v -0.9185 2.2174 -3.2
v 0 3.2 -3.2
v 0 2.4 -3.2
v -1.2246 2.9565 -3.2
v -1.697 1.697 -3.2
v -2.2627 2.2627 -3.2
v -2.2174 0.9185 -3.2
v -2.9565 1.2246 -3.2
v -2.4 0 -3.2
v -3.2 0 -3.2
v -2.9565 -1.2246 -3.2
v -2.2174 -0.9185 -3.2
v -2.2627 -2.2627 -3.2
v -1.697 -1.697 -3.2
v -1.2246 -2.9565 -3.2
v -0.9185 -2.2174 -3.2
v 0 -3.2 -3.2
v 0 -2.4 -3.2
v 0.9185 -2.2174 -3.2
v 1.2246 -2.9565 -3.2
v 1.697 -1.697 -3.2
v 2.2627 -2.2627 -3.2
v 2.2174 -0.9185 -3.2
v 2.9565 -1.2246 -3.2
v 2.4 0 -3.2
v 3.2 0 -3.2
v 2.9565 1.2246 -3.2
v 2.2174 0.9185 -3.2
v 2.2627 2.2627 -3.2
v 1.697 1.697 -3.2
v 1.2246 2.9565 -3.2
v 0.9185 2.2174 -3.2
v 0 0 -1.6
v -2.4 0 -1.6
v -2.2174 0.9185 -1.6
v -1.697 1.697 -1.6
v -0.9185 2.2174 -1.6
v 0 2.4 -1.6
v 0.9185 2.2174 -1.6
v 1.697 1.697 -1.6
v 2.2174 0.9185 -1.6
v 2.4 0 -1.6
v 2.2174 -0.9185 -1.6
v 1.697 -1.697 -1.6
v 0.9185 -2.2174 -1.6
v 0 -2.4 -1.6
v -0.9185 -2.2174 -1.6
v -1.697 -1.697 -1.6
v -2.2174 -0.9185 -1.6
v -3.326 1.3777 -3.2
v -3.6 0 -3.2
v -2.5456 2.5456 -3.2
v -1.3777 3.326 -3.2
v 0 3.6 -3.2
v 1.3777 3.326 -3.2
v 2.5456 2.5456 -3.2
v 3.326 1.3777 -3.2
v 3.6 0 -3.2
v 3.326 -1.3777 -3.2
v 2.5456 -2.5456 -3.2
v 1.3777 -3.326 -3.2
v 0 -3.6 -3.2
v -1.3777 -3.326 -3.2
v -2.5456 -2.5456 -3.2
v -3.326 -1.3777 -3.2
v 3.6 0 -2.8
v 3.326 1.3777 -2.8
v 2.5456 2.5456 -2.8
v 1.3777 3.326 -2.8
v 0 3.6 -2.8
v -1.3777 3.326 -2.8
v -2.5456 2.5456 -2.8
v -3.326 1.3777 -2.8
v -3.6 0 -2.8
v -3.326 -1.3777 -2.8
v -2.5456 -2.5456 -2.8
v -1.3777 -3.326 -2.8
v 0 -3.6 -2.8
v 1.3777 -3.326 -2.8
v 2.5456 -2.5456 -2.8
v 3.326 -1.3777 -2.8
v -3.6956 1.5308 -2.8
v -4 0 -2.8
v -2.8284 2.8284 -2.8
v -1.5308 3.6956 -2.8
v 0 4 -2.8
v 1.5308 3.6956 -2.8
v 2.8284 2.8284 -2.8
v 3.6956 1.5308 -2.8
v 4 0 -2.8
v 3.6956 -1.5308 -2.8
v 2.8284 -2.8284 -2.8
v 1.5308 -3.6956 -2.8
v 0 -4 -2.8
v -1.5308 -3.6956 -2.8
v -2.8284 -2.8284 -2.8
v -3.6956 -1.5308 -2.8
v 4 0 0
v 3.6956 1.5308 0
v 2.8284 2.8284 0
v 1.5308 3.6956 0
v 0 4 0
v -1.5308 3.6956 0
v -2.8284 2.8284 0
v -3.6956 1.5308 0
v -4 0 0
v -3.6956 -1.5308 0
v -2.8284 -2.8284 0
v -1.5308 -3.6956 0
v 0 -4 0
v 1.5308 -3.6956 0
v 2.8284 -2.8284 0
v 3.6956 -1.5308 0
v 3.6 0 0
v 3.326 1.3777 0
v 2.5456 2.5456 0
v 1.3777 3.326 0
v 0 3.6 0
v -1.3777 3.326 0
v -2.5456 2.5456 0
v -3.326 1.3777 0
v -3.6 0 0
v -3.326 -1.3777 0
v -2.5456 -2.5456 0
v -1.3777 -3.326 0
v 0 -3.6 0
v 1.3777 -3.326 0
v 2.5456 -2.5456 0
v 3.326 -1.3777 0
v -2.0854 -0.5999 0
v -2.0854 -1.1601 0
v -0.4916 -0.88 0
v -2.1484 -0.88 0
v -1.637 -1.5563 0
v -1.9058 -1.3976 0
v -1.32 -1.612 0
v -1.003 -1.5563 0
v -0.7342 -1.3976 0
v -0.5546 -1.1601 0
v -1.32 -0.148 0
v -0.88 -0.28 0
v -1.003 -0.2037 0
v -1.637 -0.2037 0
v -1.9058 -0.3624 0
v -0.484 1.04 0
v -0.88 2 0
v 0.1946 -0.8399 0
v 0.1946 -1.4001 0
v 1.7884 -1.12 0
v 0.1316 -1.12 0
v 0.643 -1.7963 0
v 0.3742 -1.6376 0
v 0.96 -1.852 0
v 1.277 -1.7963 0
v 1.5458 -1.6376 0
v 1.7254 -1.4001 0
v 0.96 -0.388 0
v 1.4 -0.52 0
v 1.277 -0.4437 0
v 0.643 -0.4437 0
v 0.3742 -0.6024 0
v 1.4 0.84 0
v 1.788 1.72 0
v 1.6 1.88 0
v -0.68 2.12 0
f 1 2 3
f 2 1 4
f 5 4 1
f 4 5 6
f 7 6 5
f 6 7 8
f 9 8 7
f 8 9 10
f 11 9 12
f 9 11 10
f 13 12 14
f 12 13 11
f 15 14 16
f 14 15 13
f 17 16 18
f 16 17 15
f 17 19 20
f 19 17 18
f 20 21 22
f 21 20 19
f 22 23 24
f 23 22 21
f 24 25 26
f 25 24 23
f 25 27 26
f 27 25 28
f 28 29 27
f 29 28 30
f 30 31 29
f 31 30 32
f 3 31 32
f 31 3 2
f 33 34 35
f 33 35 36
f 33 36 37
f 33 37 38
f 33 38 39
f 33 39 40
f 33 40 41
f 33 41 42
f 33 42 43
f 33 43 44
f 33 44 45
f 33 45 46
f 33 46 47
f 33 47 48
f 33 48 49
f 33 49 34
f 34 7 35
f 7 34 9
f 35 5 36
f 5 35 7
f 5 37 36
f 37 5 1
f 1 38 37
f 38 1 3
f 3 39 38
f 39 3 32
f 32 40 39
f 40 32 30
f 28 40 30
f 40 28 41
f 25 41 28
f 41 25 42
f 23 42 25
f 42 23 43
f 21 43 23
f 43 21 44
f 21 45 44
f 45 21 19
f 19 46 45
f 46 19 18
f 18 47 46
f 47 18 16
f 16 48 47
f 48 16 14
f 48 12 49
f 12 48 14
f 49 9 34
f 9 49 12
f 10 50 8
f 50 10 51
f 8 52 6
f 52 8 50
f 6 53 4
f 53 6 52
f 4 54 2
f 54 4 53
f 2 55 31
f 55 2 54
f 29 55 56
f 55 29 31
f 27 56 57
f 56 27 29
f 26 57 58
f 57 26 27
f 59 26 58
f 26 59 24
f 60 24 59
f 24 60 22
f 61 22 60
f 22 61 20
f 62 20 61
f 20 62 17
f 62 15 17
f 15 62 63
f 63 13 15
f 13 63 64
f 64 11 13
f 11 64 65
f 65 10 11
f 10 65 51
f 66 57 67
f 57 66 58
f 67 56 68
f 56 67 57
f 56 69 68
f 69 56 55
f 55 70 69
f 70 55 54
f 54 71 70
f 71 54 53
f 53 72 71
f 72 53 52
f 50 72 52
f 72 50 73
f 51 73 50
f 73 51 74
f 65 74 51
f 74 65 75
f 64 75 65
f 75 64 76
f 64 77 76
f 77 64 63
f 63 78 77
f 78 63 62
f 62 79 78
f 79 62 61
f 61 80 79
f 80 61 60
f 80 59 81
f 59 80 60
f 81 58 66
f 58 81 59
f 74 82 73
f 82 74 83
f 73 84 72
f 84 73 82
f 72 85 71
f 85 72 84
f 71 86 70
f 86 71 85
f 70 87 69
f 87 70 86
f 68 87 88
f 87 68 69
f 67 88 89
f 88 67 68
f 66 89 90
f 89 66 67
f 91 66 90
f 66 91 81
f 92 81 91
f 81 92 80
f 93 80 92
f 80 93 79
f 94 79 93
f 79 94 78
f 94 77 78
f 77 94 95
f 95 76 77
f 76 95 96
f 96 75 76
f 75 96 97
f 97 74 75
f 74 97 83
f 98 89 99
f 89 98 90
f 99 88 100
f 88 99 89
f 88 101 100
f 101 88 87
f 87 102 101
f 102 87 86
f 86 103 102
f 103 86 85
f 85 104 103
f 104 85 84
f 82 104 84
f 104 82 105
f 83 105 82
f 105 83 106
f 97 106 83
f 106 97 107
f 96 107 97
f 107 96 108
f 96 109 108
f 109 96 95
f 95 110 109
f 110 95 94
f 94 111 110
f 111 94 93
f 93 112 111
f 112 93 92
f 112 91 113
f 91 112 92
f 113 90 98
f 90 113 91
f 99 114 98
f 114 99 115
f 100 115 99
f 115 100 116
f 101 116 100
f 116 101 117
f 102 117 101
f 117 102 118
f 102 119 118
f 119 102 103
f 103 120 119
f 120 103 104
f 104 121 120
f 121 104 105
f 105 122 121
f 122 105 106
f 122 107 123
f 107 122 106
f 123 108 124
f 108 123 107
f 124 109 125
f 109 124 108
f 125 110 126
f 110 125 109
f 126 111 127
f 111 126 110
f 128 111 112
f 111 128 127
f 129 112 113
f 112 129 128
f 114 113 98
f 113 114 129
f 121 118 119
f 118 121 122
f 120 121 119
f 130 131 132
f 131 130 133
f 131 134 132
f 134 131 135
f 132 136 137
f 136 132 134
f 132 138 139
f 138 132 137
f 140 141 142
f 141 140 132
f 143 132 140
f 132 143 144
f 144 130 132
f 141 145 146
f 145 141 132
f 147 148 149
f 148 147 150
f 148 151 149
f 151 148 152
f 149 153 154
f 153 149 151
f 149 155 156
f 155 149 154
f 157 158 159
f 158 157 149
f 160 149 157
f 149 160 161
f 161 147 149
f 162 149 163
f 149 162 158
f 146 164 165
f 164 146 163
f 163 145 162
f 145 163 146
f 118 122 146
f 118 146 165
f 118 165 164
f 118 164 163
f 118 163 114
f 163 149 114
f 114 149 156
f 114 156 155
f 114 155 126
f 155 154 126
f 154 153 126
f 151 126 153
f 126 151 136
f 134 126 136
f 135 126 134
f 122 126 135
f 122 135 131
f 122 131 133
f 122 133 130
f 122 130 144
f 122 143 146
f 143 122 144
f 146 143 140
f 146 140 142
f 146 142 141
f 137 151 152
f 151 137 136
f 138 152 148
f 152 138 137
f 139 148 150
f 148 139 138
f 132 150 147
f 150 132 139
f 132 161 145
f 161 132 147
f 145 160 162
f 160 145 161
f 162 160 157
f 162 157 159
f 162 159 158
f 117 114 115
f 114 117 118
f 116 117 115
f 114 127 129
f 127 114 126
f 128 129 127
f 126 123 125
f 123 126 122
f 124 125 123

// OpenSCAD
// file: ../p/4-4disc.scad
use <../lib.scad>
function ldraw_lib__4_4disc() = [
// 0 Disc 1.0
// 0 Name: 4-4disc.dat
// 0 Author: James Jessiman
// 0 !LDRAW_ORG Primitive UPDATE 2002-02
// 0 !LICENSE Licensed under CC BY 2.0 and CC BY 4.0 : see CAreadme.txt
// 
// 0 BFC CERTIFY CCW
  [0,"BFC","CERTIFY"],
  [0,"BFC","CCW"],
// 
// 0 !HISTORY 1998-12-15 [PTadmin] Official Update 1998-10
// 0 !HISTORY 2002-03-23 [sbliss] Added BFC statement
// 0 !HISTORY 2002-04-25 [PTadmin] Official Update 2002-02
// 0 !HISTORY 2007-06-24 [PTadmin] Header formatted for Contributor Agreement
// 0 !HISTORY 2008-07-01 [PTadmin] Official Update 2008-01
// 
// 
// 3 16 0 0 0 1 0 0 0.9239 0 0.3827
  [3,16,0,0,0,1,0,0,0.9239,0,0.3827],
// 3 16 0 0 0 0.9239 0 0.3827 0.7071 0 0.7071
  [3,16,0,0,0,0.9239,0,0.3827,0.7071,0,0.7071],
// 3 16 0 0 0 0.7071 0 0.7071 0.3827 0 0.9239
  [3,16,0,0,0,0.7071,0,0.7071,0.3827,0,0.9239],
// 3 16 0 0 0 0.3827 0 0.9239 0 0 1
  [3,16,0,0,0,0.3827,0,0.9239,0,0,1],
// 3 16 0 0 0 0 0 1 -0.3827 0 0.9239
  [3,16,0,0,0,0,0,1,-0.3827,0,0.9239],
// 3 16 0 0 0 -0.3827 0 0.9239 -0.7071 0 0.7071
  [3,16,0,0,0,-0.3827,0,0.9239,-0.7071,0,0.7071],
// 3 16 0 0 0 -0.7071 0 0.7071 -0.9239 0 0.3827
  [3,16,0,0,0,-0.7071,0,0.7071,-0.9239,0,0.3827],
// 3 16 0 0 0 -0.9239 0 0.3827 -1 0 -0
  [3,16,0,0,0,-0.9239,0,0.3827,-1,0,-0],
// 3 16 0 0 0 -1 0 -0 -0.9239 0 -0.3827
  [3,16,0,0,0,-1,0,-0,-0.9239,0,-0.3827],
// 3 16 0 0 0 -0.9239 0 -0.3827 -0.7071 0 -0.7071
  [3,16,0,0,0,-0.9239,0,-0.3827,-0.7071,0,-0.7071],
// 3 16 0 0 0 -0.7071 0 -0.7071 -0.3827 0 -0.9239
  [3,16,0,0,0,-0.7071,0,-0.7071,-0.3827,0,-0.9239],
// 3 16 0 0 0 -0.3827 0 -0.9239 0 0 -1
  [3,16,0,0,0,-0.3827,0,-0.9239,0,0,-1],
// 3 16 0 0 0 0 0 -1 0.3827 0 -0.9239
  [3,16,0,0,0,0,0,-1,0.3827,0,-0.9239],
// 3 16 0 0 0 0.3827 0 -0.9239 0.7071 0 -0.7071
  [3,16,0,0,0,0.3827,0,-0.9239,0.7071,0,-0.7071],
// 3 16 0 0 0 0.7071 0 -0.7071 0.9239 0 -0.3827
  [3,16,0,0,0,0.7071,0,-0.7071,0.9239,0,-0.3827],
// 3 16 0 0 0 0.9239 0 -0.3827 1 0 0
  [3,16,0,0,0,0.9239,0,-0.3827,1,0,0],
// 0
];
module ldraw_lib__4_4disc(step=0, col=false, unit=2/5, alt=false, line=0.2, solid=!$preview)
    makepoly(ldraw_lib__4_4disc(), step=step, col=col, unit=unit, alt=alt, line=line, solid=solid);
ldraw_lib__4_4disc(line=0.2);
// file: ../p/4-4ring3.scad
use <../lib.scad>
function ldraw_lib__4_4ring3() = [
// 0 Ring  3 x 1.0
// 0 Name: 4-4ring3.dat
// 0 Author: James Jessiman
// 0 !LDRAW_ORG Primitive UPDATE 2009-01
// 0 !LICENSE Licensed under CC BY 2.0 and CC BY 4.0 : see CAreadme.txt
// 
// 0 BFC CERTIFY CCW
  [0,"BFC","CERTIFY"],
  [0,"BFC","CCW"],
// 
// 0 !HISTORY 1998-12-15 [PTadmin] Official Update 1998-10
// 0 !HISTORY 2002-04-05 [hafhead] Added BFC statement
// 0 !HISTORY 2002-04-25 [PTadmin] Official Update 2002-02
// 0 !HISTORY 2007-06-24 [PTadmin] Header formatted for Contributor Agreement
// 0 !HISTORY 2008-07-01 [PTadmin] Official Update 2008-01
// 0 !HISTORY 2008-08-26 [cwdee] Switch polygon winding and rename
// 0 !HISTORY 2009-05-02 [PTadmin] Official Update 2009-01
// 
// 
// 4 16 -1.5308 0 3.6956 -1.1481 0 2.7717 0 0 3 0 0 4
  [4,16,-1.5308,0,3.6956,-1.1481,0,2.7717,0,0,3,0,0,4],
// 4 16 -2.8284 0 2.8284 -2.1213 0 2.1213 -1.1481 0 2.7717 -1.5308 0 3.6956
  [4,16,-2.8284,0,2.8284,-2.1213,0,2.1213,-1.1481,0,2.7717,-1.5308,0,3.6956],
// 4 16 -3.6956 0 1.5308 -2.7717 0 1.1481 -2.1213 0 2.1213 -2.8284 0 2.8284
  [4,16,-3.6956,0,1.5308,-2.7717,0,1.1481,-2.1213,0,2.1213,-2.8284,0,2.8284],
// 4 16 -4 0 0 -3 0 0 -2.7717 0 1.1481 -3.6956 0 1.5308
  [4,16,-4,0,0,-3,0,0,-2.7717,0,1.1481,-3.6956,0,1.5308],
// 4 16 -3.6956 0 -1.5308 -2.7717 0 -1.1481 -3 0 0 -4 0 0
  [4,16,-3.6956,0,-1.5308,-2.7717,0,-1.1481,-3,0,0,-4,0,0],
// 4 16 -2.8284 0 -2.8284 -2.1213 0 -2.1213 -2.7717 0 -1.1481 -3.6956 0 -1.5308
  [4,16,-2.8284,0,-2.8284,-2.1213,0,-2.1213,-2.7717,0,-1.1481,-3.6956,0,-1.5308],
// 4 16 -1.5308 0 -3.6956 -1.1481 0 -2.7717 -2.1213 0 -2.1213 -2.8284 0 -2.8284
  [4,16,-1.5308,0,-3.6956,-1.1481,0,-2.7717,-2.1213,0,-2.1213,-2.8284,0,-2.8284],
// 4 16 0 0 -4 0 0 -3 -1.1481 0 -2.7717 -1.5308 0 -3.6956
  [4,16,0,0,-4,0,0,-3,-1.1481,0,-2.7717,-1.5308,0,-3.6956],
// 4 16 1.5308 0 -3.6956 1.1481 0 -2.7717 0 0 -3 0 0 -4
  [4,16,1.5308,0,-3.6956,1.1481,0,-2.7717,0,0,-3,0,0,-4],
// 4 16 2.8284 0 -2.8284 2.1213 0 -2.1213 1.1481 0 -2.7717 1.5308 0 -3.6956
  [4,16,2.8284,0,-2.8284,2.1213,0,-2.1213,1.1481,0,-2.7717,1.5308,0,-3.6956],
// 4 16 3.6956 0 -1.5308 2.7717 0 -1.1481 2.1213 0 -2.1213 2.8284 0 -2.8284
  [4,16,3.6956,0,-1.5308,2.7717,0,-1.1481,2.1213,0,-2.1213,2.8284,0,-2.8284],
// 4 16 4 0 0 3 0 0 2.7717 0 -1.1481 3.6956 0 -1.5308
  [4,16,4,0,0,3,0,0,2.7717,0,-1.1481,3.6956,0,-1.5308],
// 4 16 3.6956 0 1.5308 2.7717 0 1.1481 3 0 0 4 0 0
  [4,16,3.6956,0,1.5308,2.7717,0,1.1481,3,0,0,4,0,0],
// 4 16 2.8284 0 2.8284 2.1213 0 2.1213 2.7717 0 1.1481 3.6956 0 1.5308
  [4,16,2.8284,0,2.8284,2.1213,0,2.1213,2.7717,0,1.1481,3.6956,0,1.5308],
// 4 16 1.5308 0 3.6956 1.1481 0 2.7717 2.1213 0 2.1213 2.8284 0 2.8284
  [4,16,1.5308,0,3.6956,1.1481,0,2.7717,2.1213,0,2.1213,2.8284,0,2.8284],
// 4 16 0 0 4 0 0 3 1.1481 0 2.7717 1.5308 0 3.6956
  [4,16,0,0,4,0,0,3,1.1481,0,2.7717,1.5308,0,3.6956],
// 0
];
module ldraw_lib__4_4ring3(step=0, col=false, unit=2/5, alt=false, line=0.2, solid=!$preview)
    makepoly(ldraw_lib__4_4ring3(), step=step, col=col, unit=unit, alt=alt, line=line, solid=solid);
ldraw_lib__4_4ring3(line=0.2);
// file: ../p/4-4cylc.scad
use <../lib.scad>
use <4-4cyli.scad>
use <4-4disc.scad>
use <4-4edge.scad>
function ldraw_lib__4_4cylc() = [
// 0 Cylinder Closed 1.0
// 0 Name: 4-4cylc.dat
// 0 Author: Alex Taylor [anathema]
// 0 !LDRAW_ORG Primitive UPDATE 2009-02
// 0 !LICENSE Licensed under CC BY 2.0 and CC BY 4.0 : see CAreadme.txt
// 
// 0 BFC CERTIFY CCW
  [0,"BFC","CERTIFY"],
  [0,"BFC","CCW"],
// 
// 0 !HISTORY 2008-12-29 [cwdee] Removed one disc
// 0 !HISTORY 2009-09-03 [PTadmin] Official Update 2009-02
// 
// 
// 1 16 0 0 0 1 0 0 0 1 0 0 0 1 4-4edge.dat
  [1,16,0,0,0,1,0,0,0,1,0,0,0,1, ldraw_lib__4_4edge()],
// 1 16 0 1 0 1 0 0 0 1 0 0 0 1 4-4edge.dat
  [1,16,0,1,0,1,0,0,0,1,0,0,0,1, ldraw_lib__4_4edge()],
// 1 16 0 0 0 1 0 0 0 1 0 0 0 1 4-4disc.dat
  [1,16,0,0,0,1,0,0,0,1,0,0,0,1, ldraw_lib__4_4disc()],
// 1 16 0 0 0 1 0 0 0 1 0 0 0 1 4-4cyli.dat
  [1,16,0,0,0,1,0,0,0,1,0,0,0,1, ldraw_lib__4_4cyli()],
// 0
];
module ldraw_lib__4_4cylc(step=0, col=false, unit=2/5, alt=false, line=0.2, solid=!$preview)
    makepoly(ldraw_lib__4_4cylc(), step=step, col=col, unit=unit, alt=alt, line=line, solid=solid);
ldraw_lib__4_4cylc(line=0.2);
// file: ../p/4-4edge.scad
use <../lib.scad>
function ldraw_lib__4_4edge() = [
// 0 Circle 1.0
// 0 Name: 4-4edge.dat
// 0 Author: James Jessiman
// 0 !LDRAW_ORG Primitive UPDATE 2017-01
// 0 !LICENSE Licensed under CC BY 2.0 and CC BY 4.0 : see CAreadme.txt
// 
// 0 BFC CERTIFY CCW
  [0,"BFC","CERTIFY"],
  [0,"BFC","CCW"],
// 
// 0 !HISTORY 1998-12-15 [PTadmin] Official Update 1998-10
// 0 !HISTORY 2005-12-28 [PTadmin] Official Update 2005-01
// 0 !HISTORY 2007-06-24 [PTadmin] Header formatted for Contributor Agreement
// 0 !HISTORY 2008-07-01 [PTadmin] Official Update 2008-01
// 0 !HISTORY 2017-01-15 [Steffen] BFCed
// 0 !HISTORY 2017-12-30 [PTadmin] Official Update 2017-01
// 
// 
// 2 24 1 0 0 0.9239 0 0.3827
  [2,24,1,0,0,0.9239,0,0.3827],
// 2 24 0.9239 0 0.3827 0.7071 0 0.7071
  [2,24,0.9239,0,0.3827,0.7071,0,0.7071],
// 2 24 0.7071 0 0.7071 0.3827 0 0.9239
  [2,24,0.7071,0,0.7071,0.3827,0,0.9239],
// 2 24 0.3827 0 0.9239 0 0 1
  [2,24,0.3827,0,0.9239,0,0,1],
// 2 24 0 0 1 -0.3827 0 0.9239
  [2,24,0,0,1,-0.3827,0,0.9239],
// 2 24 -0.3827 0 0.9239 -0.7071 0 0.7071
  [2,24,-0.3827,0,0.9239,-0.7071,0,0.7071],
// 2 24 -0.7071 0 0.7071 -0.9239 0 0.3827
  [2,24,-0.7071,0,0.7071,-0.9239,0,0.3827],
// 2 24 -0.9239 0 0.3827 -1 0 -0
  [2,24,-0.9239,0,0.3827,-1,0,-0],
// 2 24 -1 0 -0 -0.9239 0 -0.3827
  [2,24,-1,0,-0,-0.9239,0,-0.3827],
// 2 24 -0.9239 0 -0.3827 -0.7071 0 -0.7071
  [2,24,-0.9239,0,-0.3827,-0.7071,0,-0.7071],
// 2 24 -0.7071 0 -0.7071 -0.3827 0 -0.9239
  [2,24,-0.7071,0,-0.7071,-0.3827,0,-0.9239],
// 2 24 -0.3827 0 -0.9239 0 0 -1
  [2,24,-0.3827,0,-0.9239,0,0,-1],
// 2 24 0 0 -1 0.3827 0 -0.9239
  [2,24,0,0,-1,0.3827,0,-0.9239],
// 2 24 0.3827 0 -0.9239 0.7071 0 -0.7071
  [2,24,0.3827,0,-0.9239,0.7071,0,-0.7071],
// 2 24 0.7071 0 -0.7071 0.9239 0 -0.3827
  [2,24,0.7071,0,-0.7071,0.9239,0,-0.3827],
// 2 24 0.9239 0 -0.3827 1 0 0
  [2,24,0.9239,0,-0.3827,1,0,0],
];
module ldraw_lib__4_4edge(step=0, col=false, unit=2/5, alt=false, line=0.2, solid=!$preview)
    makepoly(ldraw_lib__4_4edge(), step=step, col=col, unit=unit, alt=alt, line=line, solid=solid);
ldraw_lib__4_4edge(line=0.2);
// file: ../p/4-4cyli.scad
use <../lib.scad>
function ldraw_lib__4_4cyli() = [
// 0 Cylinder 1.0
// 0 Name: 4-4cyli.dat
// 0 Author: James Jessiman
// 0 !LDRAW_ORG Primitive UPDATE 2005-01
// 0 !LICENSE Licensed under CC BY 2.0 and CC BY 4.0 : see CAreadme.txt
// 
// 0 BFC CERTIFY CCW
  [0,"BFC","CERTIFY"],
  [0,"BFC","CCW"],
// 
// 0 !HISTORY 1998-12-15 [PTadmin] Official Update 1998-10
// 0 !HISTORY 2002-03-23 [sbliss] Added BFC statement; merged headers from files in distributions LDraw 0.27 and Complete.
// 0 !HISTORY 2002-04-25 [PTadmin] Official Update 2002-02
// 0 !HISTORY 2004-12-14 [guyvivan] BFC CCW
// 0 !HISTORY 2005-12-28 [PTadmin] Official Update 2005-01
// 0 !HISTORY 2007-06-24 [PTadmin] Header formatted for Contributor Agreement
// 0 !HISTORY 2008-07-01 [PTadmin] Official Update 2008-01
// 
// 
// 4 16 1 1 0 0.9239 1 0.3827 0.9239 0 0.3827 1 0 0
  [4,16,1,1,0,0.9239,1,0.3827,0.9239,0,0.3827,1,0,0],
// 5 24 1 0 0 1 1 0 0.9239 0 0.3827 0.9239 0 -0.3827
  [5,24,1,0,0,1,1,0,0.9239,0,0.3827,0.9239,0,-0.3827],
// 4 16 0.9239 1 0.3827 0.7071 1 0.7071 0.7071 0 0.7071 0.9239 0 0.3827
  [4,16,0.9239,1,0.3827,0.7071,1,0.7071,0.7071,0,0.7071,0.9239,0,0.3827],
// 5 24 0.9239 0 0.3827 0.9239 1 0.3827 0.7071 0 0.7071 1 0 0
  [5,24,0.9239,0,0.3827,0.9239,1,0.3827,0.7071,0,0.7071,1,0,0],
// 4 16 0.7071 1 0.7071 0.3827 1 0.9239 0.3827 0 0.9239 0.7071 0 0.7071
  [4,16,0.7071,1,0.7071,0.3827,1,0.9239,0.3827,0,0.9239,0.7071,0,0.7071],
// 5 24 0.7071 0 0.7071 0.7071 1 0.7071 0.3827 0 0.9239 0.9239 0 0.3827
  [5,24,0.7071,0,0.7071,0.7071,1,0.7071,0.3827,0,0.9239,0.9239,0,0.3827],
// 4 16 0.3827 1 0.9239 0 1 1 0 0 1 0.3827 0 0.9239
  [4,16,0.3827,1,0.9239,0,1,1,0,0,1,0.3827,0,0.9239],
// 5 24 0.3827 0 0.9239 0.3827 1 0.9239 0 0 1 0.7071 0 0.7071
  [5,24,0.3827,0,0.9239,0.3827,1,0.9239,0,0,1,0.7071,0,0.7071],
// 4 16 0 1 1 -0.3827 1 0.9239 -0.3827 0 0.9239 0 0 1
  [4,16,0,1,1,-0.3827,1,0.9239,-0.3827,0,0.9239,0,0,1],
// 5 24 0 0 1 0 1 1 -0.3827 0 0.9239 0.3827 0 0.9239
  [5,24,0,0,1,0,1,1,-0.3827,0,0.9239,0.3827,0,0.9239],
// 4 16 -0.3827 1 0.9239 -0.7071 1 0.7071 -0.7071 0 0.7071 -0.3827 0 0.9239
  [4,16,-0.3827,1,0.9239,-0.7071,1,0.7071,-0.7071,0,0.7071,-0.3827,0,0.9239],
// 5 24 -0.3827 0 0.9239 -0.3827 1 0.9239 -0.7071 0 0.7071 0 0 1
  [5,24,-0.3827,0,0.9239,-0.3827,1,0.9239,-0.7071,0,0.7071,0,0,1],
// 4 16 -0.7071 1 0.7071 -0.9239 1 0.3827 -0.9239 0 0.3827 -0.7071 0 0.7071
  [4,16,-0.7071,1,0.7071,-0.9239,1,0.3827,-0.9239,0,0.3827,-0.7071,0,0.7071],
// 5 24 -0.7071 0 0.7071 -0.7071 1 0.7071 -0.9239 0 0.3827 -0.3827 0 0.9239
  [5,24,-0.7071,0,0.7071,-0.7071,1,0.7071,-0.9239,0,0.3827,-0.3827,0,0.9239],
// 4 16 -0.9239 1 0.3827 -1 1 0 -1 0 0 -0.9239 0 0.3827
  [4,16,-0.9239,1,0.3827,-1,1,0,-1,0,0,-0.9239,0,0.3827],
// 5 24 -0.9239 0 0.3827 -0.9239 1 0.3827 -1 0 0 -0.7071 0 0.7071
  [5,24,-0.9239,0,0.3827,-0.9239,1,0.3827,-1,0,0,-0.7071,0,0.7071],
// 4 16 -1 1 0 -0.9239 1 -0.3827 -0.9239 0 -0.3827 -1 0 0
  [4,16,-1,1,0,-0.9239,1,-0.3827,-0.9239,0,-0.3827,-1,0,0],
// 5 24 -1 0 0 -1 1 0 -0.9239 0 -0.3827 -0.9239 0 0.3827
  [5,24,-1,0,0,-1,1,0,-0.9239,0,-0.3827,-0.9239,0,0.3827],
// 4 16 -0.9239 1 -0.3827 -0.7071 1 -0.7071 -0.7071 0 -0.7071 -0.9239 0 -0.3827
  [4,16,-0.9239,1,-0.3827,-0.7071,1,-0.7071,-0.7071,0,-0.7071,-0.9239,0,-0.3827],
// 5 24 -0.9239 0 -0.3827 -0.9239 1 -0.3827 -0.7071 0 -0.7071 -1 0 0
  [5,24,-0.9239,0,-0.3827,-0.9239,1,-0.3827,-0.7071,0,-0.7071,-1,0,0],
// 4 16 -0.7071 1 -0.7071 -0.3827 1 -0.9239 -0.3827 0 -0.9239 -0.7071 0 -0.7071
  [4,16,-0.7071,1,-0.7071,-0.3827,1,-0.9239,-0.3827,0,-0.9239,-0.7071,0,-0.7071],
// 5 24 -0.7071 0 -0.7071 -0.7071 1 -0.7071 -0.3827 0 -0.9239 -0.9239 0 -0.3827
  [5,24,-0.7071,0,-0.7071,-0.7071,1,-0.7071,-0.3827,0,-0.9239,-0.9239,0,-0.3827],
// 4 16 -0.3827 1 -0.9239 0 1 -1 0 0 -1 -0.3827 0 -0.9239
  [4,16,-0.3827,1,-0.9239,0,1,-1,0,0,-1,-0.3827,0,-0.9239],
// 5 24 -0.3827 0 -0.9239 -0.3827 1 -0.9239 0 0 -1 -0.7071 0 -0.7071
  [5,24,-0.3827,0,-0.9239,-0.3827,1,-0.9239,0,0,-1,-0.7071,0,-0.7071],
// 4 16 0 1 -1 0.3827 1 -0.9239 0.3827 0 -0.9239 0 0 -1
  [4,16,0,1,-1,0.3827,1,-0.9239,0.3827,0,-0.9239,0,0,-1],
// 5 24 0 0 -1 0 1 -1 0.3827 0 -0.9239 -0.3827 0 -0.9239
  [5,24,0,0,-1,0,1,-1,0.3827,0,-0.9239,-0.3827,0,-0.9239],
// 4 16 0.3827 1 -0.9239 0.7071 1 -0.7071 0.7071 0 -0.7071 0.3827 0 -0.9239
  [4,16,0.3827,1,-0.9239,0.7071,1,-0.7071,0.7071,0,-0.7071,0.3827,0,-0.9239],
// 5 24 0.3827 0 -0.9239 0.3827 1 -0.9239 0.7071 0 -0.7071 0 0 -1
  [5,24,0.3827,0,-0.9239,0.3827,1,-0.9239,0.7071,0,-0.7071,0,0,-1],
// 4 16 0.7071 1 -0.7071 0.9239 1 -0.3827 0.9239 0 -0.3827 0.7071 0 -0.7071
  [4,16,0.7071,1,-0.7071,0.9239,1,-0.3827,0.9239,0,-0.3827,0.7071,0,-0.7071],
// 5 24 0.7071 0 -0.7071 0.7071 1 -0.7071 0.9239 0 -0.3827 0.3827 0 -0.9239
  [5,24,0.7071,0,-0.7071,0.7071,1,-0.7071,0.9239,0,-0.3827,0.3827,0,-0.9239],
// 4 16 0.9239 1 -0.3827 1 1 0 1 0 0 0.9239 0 -0.3827
  [4,16,0.9239,1,-0.3827,1,1,0,1,0,0,0.9239,0,-0.3827],
// 5 24 0.9239 0 -0.3827 0.9239 1 -0.3827 1 0 0 0.7071 0 -0.7071
  [5,24,0.9239,0,-0.3827,0.9239,1,-0.3827,1,0,0,0.7071,0,-0.7071],
// 0
];
module ldraw_lib__4_4cyli(step=0, col=false, unit=2/5, alt=false, line=0.2, solid=!$preview)
    makepoly(ldraw_lib__4_4cyli(), step=step, col=col, unit=unit, alt=alt, line=line, solid=solid);
ldraw_lib__4_4cyli(line=0.2);
// file: ../p/stud4o.scad
use <../lib.scad>
use <4-4cylc.scad>
use <4-4ring3.scad>
function ldraw_lib__stud4o() = [
// 0 Stud Tube Open without Outer Cylinder
// 0 Name: stud4o.dat
// 0 Author: Magnus Forsberg [MagFors]
// 0 !LDRAW_ORG Primitive UPDATE 2011-02
// 0 !LICENSE Licensed under CC BY 2.0 and CC BY 4.0 : see CAreadme.txt
// 
// 0 !HELP This stud is a "antistud" to be used like a underside stud,
// 0 !HELP but without the outer cylinder.
// 0 !HELP 1 47 0 0 0 1 0 0 0 1 0 0 0 1 stud4.dat
// 
// 0 BFC CERTIFY CCW
  [0,"BFC","CERTIFY"],
  [0,"BFC","CCW"],
// 
// 0 !HISTORY 2011-12-29 [PTadmin] Official Update 2011-02
// 
// 
// 1 16 0 -4 0 2 0 0 0 1 0 0 0 2 4-4ring3.dat
  [1,16,0,-4,0,2,0,0,0,1,0,0,0,2, ldraw_lib__4_4ring3()],
// 0 BFC INVERTNEXT
  [0,"BFC","INVERTNEXT"],
// 1 16 0 0 0 -6 0 0 0 -4 0 0 0 6 4-4cylc.dat
  [1,16,0,0,0,-6,0,0,0,-4,0,0,0,6, ldraw_lib__4_4cylc()],
];
module ldraw_lib__stud4o(step=0, col=false, unit=2/5, alt=false, line=0.2, solid=!$preview)
    makepoly(ldraw_lib__stud4o(), step=step, col=col, unit=unit, alt=alt, line=line, solid=solid);
ldraw_lib__stud4o(line=0.2);
// file: ../p/4-4ring8.scad
use <../lib.scad>
function ldraw_lib__4_4ring8() = [
// 0 Ring  8 x 1.0
// 0 Name: 4-4ring8.dat
// 0 Author: Steffen [Steffen]
// 0 !LDRAW_ORG Primitive UPDATE 2012-01
// 0 !LICENSE Licensed under CC BY 2.0 and CC BY 4.0 : see CAreadme.txt
// 
// 0 BFC CERTIFY CCW
  [0,"BFC","CERTIFY"],
  [0,"BFC","CCW"],
// 
// 0 !HISTORY 2003-12-19 [PTadmin] Official Update 2003-03
// 0 !HISTORY 2007-06-24 [PTadmin] Header formatted for Contributor Agreement
// 0 !HISTORY 2008-07-01 [PTadmin] Official Update 2008-01
// 0 !HISTORY 2012-02-16 [Philo] Changed to CCW
// 0 !HISTORY 2012-03-30 [PTadmin] Official Update 2012-01
// 
// 
// 4 16 9 0 0 8.3151 0 3.4443 7.3912 0 3.0616 8 0 0
  [4,16,9,0,0,8.3151,0,3.4443,7.3912,0,3.0616,8,0,0],
// 4 16 8.3151 0 3.4443 6.3639 0 6.3639 5.6568 0 5.6568 7.3912 0 3.0616
  [4,16,8.3151,0,3.4443,6.3639,0,6.3639,5.6568,0,5.6568,7.3912,0,3.0616],
// 4 16 6.3639 0 6.3639 3.4443 0 8.3151 3.0616 0 7.3912 5.6568 0 5.6568
  [4,16,6.3639,0,6.3639,3.4443,0,8.3151,3.0616,0,7.3912,5.6568,0,5.6568],
// 4 16 3.4443 0 8.3151 0 0 9 0 0 8 3.0616 0 7.3912
  [4,16,3.4443,0,8.3151,0,0,9,0,0,8,3.0616,0,7.3912],
// 4 16 0 0 9 -3.4443 0 8.3151 -3.0616 0 7.3912 0 0 8
  [4,16,0,0,9,-3.4443,0,8.3151,-3.0616,0,7.3912,0,0,8],
// 4 16 -3.4443 0 8.3151 -6.3639 0 6.3639 -5.6568 0 5.6568 -3.0616 0 7.3912
  [4,16,-3.4443,0,8.3151,-6.3639,0,6.3639,-5.6568,0,5.6568,-3.0616,0,7.3912],
// 4 16 -6.3639 0 6.3639 -8.3151 0 3.4443 -7.3912 0 3.0616 -5.6568 0 5.6568
  [4,16,-6.3639,0,6.3639,-8.3151,0,3.4443,-7.3912,0,3.0616,-5.6568,0,5.6568],
// 4 16 -8.3151 0 3.4443 -9 0 0 -8 0 0 -7.3912 0 3.0616
  [4,16,-8.3151,0,3.4443,-9,0,0,-8,0,0,-7.3912,0,3.0616],
// 4 16 -9 0 0 -8.3151 0 -3.4443 -7.3912 0 -3.0616 -8 0 0
  [4,16,-9,0,0,-8.3151,0,-3.4443,-7.3912,0,-3.0616,-8,0,0],
// 4 16 -8.3151 0 -3.4443 -6.3639 0 -6.3639 -5.6568 0 -5.6568 -7.3912 0 -3.0616
  [4,16,-8.3151,0,-3.4443,-6.3639,0,-6.3639,-5.6568,0,-5.6568,-7.3912,0,-3.0616],
// 4 16 -6.3639 0 -6.3639 -3.4443 0 -8.3151 -3.0616 0 -7.3912 -5.6568 0 -5.6568
  [4,16,-6.3639,0,-6.3639,-3.4443,0,-8.3151,-3.0616,0,-7.3912,-5.6568,0,-5.6568],
// 4 16 -3.4443 0 -8.3151 0 0 -9 0 0 -8 -3.0616 0 -7.3912
  [4,16,-3.4443,0,-8.3151,0,0,-9,0,0,-8,-3.0616,0,-7.3912],
// 4 16 0 0 -9 3.4443 0 -8.3151 3.0616 0 -7.3912 0 0 -8
  [4,16,0,0,-9,3.4443,0,-8.3151,3.0616,0,-7.3912,0,0,-8],
// 4 16 3.4443 0 -8.3151 6.3639 0 -6.3639 5.6568 0 -5.6568 3.0616 0 -7.3912
  [4,16,3.4443,0,-8.3151,6.3639,0,-6.3639,5.6568,0,-5.6568,3.0616,0,-7.3912],
// 4 16 6.3639 0 -6.3639 8.3151 0 -3.4443 7.3912 0 -3.0616 5.6568 0 -5.6568
  [4,16,6.3639,0,-6.3639,8.3151,0,-3.4443,7.3912,0,-3.0616,5.6568,0,-5.6568],
// 4 16 8.3151 0 -3.4443 9 0 0 8 0 0 7.3912 0 -3.0616
  [4,16,8.3151,0,-3.4443,9,0,0,8,0,0,7.3912,0,-3.0616],
];
module ldraw_lib__4_4ring8(step=0, col=false, unit=2/5, alt=false, line=0.2, solid=!$preview)
    makepoly(ldraw_lib__4_4ring8(), step=step, col=col, unit=unit, alt=alt, line=line, solid=solid);
ldraw_lib__4_4ring8(line=0.2);
// file: ../p/4-4cylo.scad
use <../lib.scad>
use <4-4cyli.scad>
use <4-4edge.scad>
function ldraw_lib__4_4cylo() = [
// 0 Cylinder Open 1.0
// 0 Name: 4-4cylo.dat
// 0 Author: Mark Kennedy [mkennedy]
// 0 !LDRAW_ORG Primitive UPDATE 2010-01
// 0 !LICENSE Licensed under CC BY 2.0 and CC BY 4.0 : see CAreadme.txt
// 
// 0 BFC CERTIFY CCW
  [0,"BFC","CERTIFY"],
  [0,"BFC","CCW"],
// 
// 0 !HISTORY 2010-04-05 [PTadmin] Official Update 2010-01
// 
// 
// 1 16 0 0 0 1 0 0 0 1 0 0 0 1 4-4edge.dat
  [1,16,0,0,0,1,0,0,0,1,0,0,0,1, ldraw_lib__4_4edge()],
// 1 16 0 1 0 1 0 0 0 1 0 0 0 1 4-4edge.dat
  [1,16,0,1,0,1,0,0,0,1,0,0,0,1, ldraw_lib__4_4edge()],
// 1 16 0 0 0 1 0 0 0 1 0 0 0 1 4-4cyli.dat
  [1,16,0,0,0,1,0,0,0,1,0,0,0,1, ldraw_lib__4_4cyli()],
// 0
];
module ldraw_lib__4_4cylo(step=0, col=false, unit=2/5, alt=false, line=0.2, solid=!$preview)
    makepoly(ldraw_lib__4_4cylo(), step=step, col=col, unit=unit, alt=alt, line=line, solid=solid);
ldraw_lib__4_4cylo(line=0.2);
// file: s/98138s02.scad
use <../../lib.scad>
use <../../p/4-4cylo.scad>
use <../../p/4-4ring8.scad>
use <../../p/4-4ring9.scad>
use <../../p/stud4o.scad>
function ldraw_lib__s__98138s02() = [
// 0 ~Tile  1 x  1 Round with Groove without Complete Top Face
// 0 Name: s\98138s02.dat
// 0 Author: Magnus Forsberg [MagFors]
// 0 !LDRAW_ORG Subpart UPDATE 2020-01
// 0 !LICENSE Licensed under CC BY 2.0 and CC BY 4.0 : see CAreadme.txt
// 
// 0 BFC CERTIFY CCW
  [0,"BFC","CERTIFY"],
  [0,"BFC","CCW"],
// 
// 0 !HISTORY 2020-06-28 [PTadmin] Official Update 2020-01
// 
// 
// 1 16 0 4 0 1 0 0 0 -1 0 0 0 1 stud4o.dat
  [1,16,0,4,0,1,0,0,0,-1,0,0,0,1, ldraw_lib__stud4o()],
// 1 16 0 8 0 -1 0 0 0 -1 0 0 0 1 4-4ring8.dat
  [1,16,0,8,0,-1,0,0,0,-1,0,0,0,1, ldraw_lib__4_4ring8()],
// 1 16 0 7 0 9 0 0 0 1 0 0 0 9 4-4cylo.dat
  [1,16,0,7,0,9,0,0,0,1,0,0,0,9, ldraw_lib__4_4cylo()],
// 1 16 0 7 0 -1 0 0 0 -1 0 0 0 1 4-4ring9.dat
  [1,16,0,7,0,-1,0,0,0,-1,0,0,0,1, ldraw_lib__4_4ring9()],
// 1 16 0 0 0 10 0 0 0 7 0 0 0 10 4-4cylo.dat
  [1,16,0,0,0,10,0,0,0,7,0,0,0,10, ldraw_lib__4_4cylo()],
];
module ldraw_lib__s__98138s02(step=0, col=false, unit=2/5, alt=false, line=0.2, solid=!$preview)
    makepoly(ldraw_lib__s__98138s02(), step=step, col=col, unit=unit, alt=alt, line=line, solid=solid);
ldraw_lib__s__98138s02(line=0.2);
// file: ../p/4-4ring9.scad
use <../lib.scad>
function ldraw_lib__4_4ring9() = [
// 0 Ring  9 x 1.0
// 0 Name: 4-4ring9.dat
// 0 Author: John Riley [jriley]
// 0 !LDRAW_ORG Primitive UPDATE 2004-02
// 0 !LICENSE Licensed under CC BY 2.0 and CC BY 4.0 : see CAreadme.txt
// 
// 0 BFC CERTIFY CCW
  [0,"BFC","CERTIFY"],
  [0,"BFC","CCW"],
// 
// 0 !HISTORY 2004-04-22 [PTadmin] Official Update 2004-02
// 0 !HISTORY 2007-06-24 [PTadmin] Header formatted for Contributor Agreement
// 0 !HISTORY 2008-07-01 [PTadmin] Official Update 2008-01
// 
// 
// 4 16 9 0 0 10 0 0 9.239 0 3.827 8.3151 0 3.4443
  [4,16,9,0,0,10,0,0,9.239,0,3.827,8.3151,0,3.4443],
// 4 16 8.3151 0 3.4443 9.239 0 3.827 7.071 0 7.071 6.3639 0 6.3639
  [4,16,8.3151,0,3.4443,9.239,0,3.827,7.071,0,7.071,6.3639,0,6.3639],
// 4 16 6.3639 0 6.3639 7.071 0 7.071 3.827 0 9.239 3.4443 0 8.3151
  [4,16,6.3639,0,6.3639,7.071,0,7.071,3.827,0,9.239,3.4443,0,8.3151],
// 4 16 3.4443 0 8.3151 3.827 0 9.239 0 0 10 0 0 9
  [4,16,3.4443,0,8.3151,3.827,0,9.239,0,0,10,0,0,9],
// 4 16 0 0 9 0 0 10 -3.827 0 9.239 -3.4443 0 8.3151
  [4,16,0,0,9,0,0,10,-3.827,0,9.239,-3.4443,0,8.3151],
// 4 16 -3.4443 0 8.3151 -3.827 0 9.239 -7.071 0 7.071 -6.3639 0 6.3639
  [4,16,-3.4443,0,8.3151,-3.827,0,9.239,-7.071,0,7.071,-6.3639,0,6.3639],
// 4 16 -6.3639 0 6.3639 -7.071 0 7.071 -9.239 0 3.827 -8.3151 0 3.4443
  [4,16,-6.3639,0,6.3639,-7.071,0,7.071,-9.239,0,3.827,-8.3151,0,3.4443],
// 4 16 -8.3151 0 3.4443 -9.239 0 3.827 -10 0 0 -9 0 0
  [4,16,-8.3151,0,3.4443,-9.239,0,3.827,-10,0,0,-9,0,0],
// 4 16 -9 0 0 -10 0 0 -9.239 0 -3.827 -8.3151 0 -3.4443
  [4,16,-9,0,0,-10,0,0,-9.239,0,-3.827,-8.3151,0,-3.4443],
// 4 16 -8.3151 0 -3.4443 -9.239 0 -3.827 -7.071 0 -7.071 -6.3639 0 -6.3639
  [4,16,-8.3151,0,-3.4443,-9.239,0,-3.827,-7.071,0,-7.071,-6.3639,0,-6.3639],
// 4 16 -6.3639 0 -6.3639 -7.071 0 -7.071 -3.827 0 -9.239 -3.4443 0 -8.3151
  [4,16,-6.3639,0,-6.3639,-7.071,0,-7.071,-3.827,0,-9.239,-3.4443,0,-8.3151],
// 4 16 -3.4443 0 -8.3151 -3.827 0 -9.239 0 0 -10 0 0 -9
  [4,16,-3.4443,0,-8.3151,-3.827,0,-9.239,0,0,-10,0,0,-9],
// 4 16 0 0 -9 0 0 -10 3.827 0 -9.239 3.4443 0 -8.3151
  [4,16,0,0,-9,0,0,-10,3.827,0,-9.239,3.4443,0,-8.3151],
// 4 16 3.4443 0 -8.3151 3.827 0 -9.239 7.071 0 -7.071 6.3639 0 -6.3639
  [4,16,3.4443,0,-8.3151,3.827,0,-9.239,7.071,0,-7.071,6.3639,0,-6.3639],
// 4 16 6.3639 0 -6.3639 7.071 0 -7.071 9.239 0 -3.827 8.3151 0 -3.4443
  [4,16,6.3639,0,-6.3639,7.071,0,-7.071,9.239,0,-3.827,8.3151,0,-3.4443],
// 4 16 8.3151 0 -3.4443 9.239 0 -3.827 10 0 0 9 0 0
  [4,16,8.3151,0,-3.4443,9.239,0,-3.827,10,0,0,9,0,0],
// 0
];
module ldraw_lib__4_4ring9(step=0, col=false, unit=2/5, alt=false, line=0.2, solid=!$preview)
    makepoly(ldraw_lib__4_4ring9(), step=step, col=col, unit=unit, alt=alt, line=line, solid=solid);
ldraw_lib__4_4ring9(line=0.2);
// file: ../p/1-4chrd.scad
use <../lib.scad>
function ldraw_lib__1_4chrd() = [
// 0 Chord 0.25
// 0 Name: 1-4chrd.dat
// 0 Author: Tony Hafner [hafhead]
// 0 !LDRAW_ORG Primitive UPDATE 2012-02
// 0 !LICENSE Licensed under CC BY 2.0 and CC BY 4.0 : see CAreadme.txt
// 
// 0 BFC CERTIFY CCW
  [0,"BFC","CERTIFY"],
  [0,"BFC","CCW"],
// 
// 0 !HISTORY 2004-04-22 [PTadmin] Official Update 2004-02
// 0 !HISTORY 2007-10-09 [PTadmin] Header formatted for Contributor Agreement
// 0 !HISTORY 2008-07-01 [PTadmin] Official Update 2008-01
// 0 !HISTORY 2012-08-02 [MMR1988] Re-creation with PrimGen2 and Rectifier
// 0 !HISTORY 2012-08-09 [PTadmin] Official Update 2012-02
// 
// 
// 4 16 0.9239 0 0.3827 0.3827 0 0.9239 0 0 1 1 0 0
  [4,16,0.9239,0,0.3827,0.3827,0,0.9239,0,0,1,1,0,0],
// 3 16 0.7071 0 0.7071 0.3827 0 0.9239 0.9239 0 0.3827
  [3,16,0.7071,0,0.7071,0.3827,0,0.9239,0.9239,0,0.3827],
];
module ldraw_lib__1_4chrd(step=0, col=false, unit=2/5, alt=false, line=0.2, solid=!$preview)
    makepoly(ldraw_lib__1_4chrd(), step=step, col=col, unit=unit, alt=alt, line=line, solid=solid);
ldraw_lib__1_4chrd(line=0.2);
// main file
use <../lib.scad>
use <../p/1-4chrd.scad>
use <../p/4-4ring9.scad>
use <s/98138s02.scad>
function ldraw_lib__98138p0l() = [
// 0 Tile  1 x  1 Round with Notes on Coral Background Pattern
// 0 Name: 98138p0l.dat
// 0 Author: Philippe Hurbain [Philo]
// 0 !LDRAW_ORG Part UPDATE 2020-01
// 0 !LICENSE Licensed under CC BY 2.0 and CC BY 4.0 : see CAreadme.txt
// 
// 0 BFC CERTIFY CCW
  [0,"BFC","CERTIFY"],
  [0,"BFC","CCW"],
// 
// 0 !KEYWORDS Bricklink 98138pb134, Dots, Music
// 
// 0 !HISTORY 2020-06-28 [PTadmin] Official Update 2020-01
// 
// 
// 1 16 0 0 0 1 0 0 0 1 0 0 0 1 s\98138s02.dat
  [1,16,0,0,0,1,0,0,0,1,0,0,0,1, ldraw_lib__s__98138s02()],
// 1 16 0 0 0 1 0 0 0 1 0 0 0 1 4-4ring9.dat
  [1,16,0,0,0,1,0,0,0,1,0,0,0,1, ldraw_lib__4_4ring9()],
// 1 353 0 0 0 0 0 -9 0 1 0 9 0 0 1-4chrd.dat
  [1,353,0,0,0,0,0,-9,0,1,0,9,0,0, ldraw_lib__1_4chrd()],
// 4 16 -1.229 0 -2.2 -5.2134 0 -1.4997 -5.371 0 -2.2 -5.2134 0 -2.9003
  [4,16,-1.229,0,-2.2,-5.2134,0,-1.4997,-5.371,0,-2.2,-5.2134,0,-2.9003],
// 4 16 -1.229 0 -2.2 -5.2134 0 -2.9003 -4.7644 0 -3.494 -4.0925 0 -3.8907
  [4,16,-1.229,0,-2.2,-5.2134,0,-2.9003,-4.7644,0,-3.494,-4.0925,0,-3.8907],
// 4 16 -1.229 0 -2.2 -4.0925 0 -3.8907 -3.3 0 -4.03 -2.5075 0 -3.8907
  [4,16,-1.229,0,-2.2,-4.0925,0,-3.8907,-3.3,0,-4.03,-2.5075,0,-3.8907],
// 4 16 -1.229 0 -2.2 -2.5075 0 -3.8907 -1.8356 0 -3.494 -1.3866 0 -2.9003
  [4,16,-1.229,0,-2.2,-2.5075,0,-3.8907,-1.8356,0,-3.494,-1.3866,0,-2.9003],
// 4 16 -1.229 0 -2.2 -2.2 0 -0.7 -2.5075 0 -0.5093 -3.3 0 -0.37
  [4,16,-1.229,0,-2.2,-2.2,0,-0.7,-2.5075,0,-0.5093,-3.3,0,-0.37],
// 4 16 -1.229 0 -2.2 -3.3 0 -0.37 -4.0925 0 -0.5093 -4.7644 0 -0.906
  [4,16,-1.229,0,-2.2,-3.3,0,-0.37,-4.0925,0,-0.5093,-4.7644,0,-0.906],
// 3 16 -4.7644 0 -0.906 -5.2134 0 -1.4997 -1.229 0 -2.2
  [3,16,-4.7644,0,-0.906,-5.2134,0,-1.4997,-1.229,0,-2.2],
// 4 16 -2.2 0 -0.7 -1.229 0 -2.2 -1.21 0 2.6 -2.2 0 5
  [4,16,-2.2,0,-0.7,-1.229,0,-2.2,-1.21,0,2.6,-2.2,0,5],
// 4 16 4.471 0 -2.8 0.4866 0 -2.0997 0.329 0 -2.8 0.4866 0 -3.5003
  [4,16,4.471,0,-2.8,0.4866,0,-2.0997,0.329,0,-2.8,0.4866,0,-3.5003],
// 4 16 4.471 0 -2.8 0.4866 0 -3.5003 0.9356 0 -4.094 1.6075 0 -4.4907
  [4,16,4.471,0,-2.8,0.4866,0,-3.5003,0.9356,0,-4.094,1.6075,0,-4.4907],
// 4 16 4.471 0 -2.8 1.6075 0 -4.4907 2.4 0 -4.63 3.1925 0 -4.4907
  [4,16,4.471,0,-2.8,1.6075,0,-4.4907,2.4,0,-4.63,3.1925,0,-4.4907],
// 4 16 4.471 0 -2.8 3.1925 0 -4.4907 3.8644 0 -4.094 4.3134 0 -3.5003
  [4,16,4.471,0,-2.8,3.1925,0,-4.4907,3.8644,0,-4.094,4.3134,0,-3.5003],
// 4 16 4.471 0 -2.8 3.5 0 -1.3 3.1925 0 -1.1093 2.4 0 -0.97
  [4,16,4.471,0,-2.8,3.5,0,-1.3,3.1925,0,-1.1093,2.4,0,-0.97],
// 4 16 4.471 0 -2.8 2.4 0 -0.97 1.6075 0 -1.1093 0.9356 0 -1.506
  [4,16,4.471,0,-2.8,2.4,0,-0.97,1.6075,0,-1.1093,0.9356,0,-1.506],
// 3 16 0.9356 0 -1.506 0.4866 0 -2.0997 4.471 0 -2.8
  [3,16,0.9356,0,-1.506,0.4866,0,-2.0997,4.471,0,-2.8],
// 4 16 3.5 0 -1.3 4.471 0 -2.8 4.47 0 4.3 3.5 0 2.1
  [4,16,3.5,0,-1.3,4.471,0,-2.8,4.47,0,4.3,3.5,0,2.1],
// 4 16 4 0 4.7 -1.7 0 5.3 -2.2 0 5 4.47 0 4.3
  [4,16,4,0,4.7,-1.7,0,5.3,-2.2,0,5,4.47,0,4.3],
// 4 16 3.5 0 2.1 4.47 0 4.3 -2.2 0 5 -1.21 0 2.6
  [4,16,3.5,0,2.1,4.47,0,4.3,-2.2,0,5,-1.21,0,2.6],
// 3 353 0 0 9 -9 0 0 -2.2 0 5
  [3,353,0,0,9,-9,0,0,-2.2,0,5],
// 3 353 0 0 9 -2.2 0 5 -1.7 0 5.3
  [3,353,0,0,9,-2.2,0,5,-1.7,0,5.3],
// 3 353 0 0 9 -1.7 0 5.3 4 0 4.7
  [3,353,0,0,9,-1.7,0,5.3,4,0,4.7],
// 3 353 0 0 9 4 0 4.7 4.47 0 4.3
  [3,353,0,0,9,4,0,4.7,4.47,0,4.3],
// 3 353 0 0 9 4.47 0 4.3 9 0 0
  [3,353,0,0,9,4.47,0,4.3,9,0,0],
// 3 353 4.47 0 4.3 4.471 0 -2.8 9 0 0
  [3,353,4.47,0,4.3,4.471,0,-2.8,9,0,0],
// 3 353 9 0 0 4.471 0 -2.8 4.3134 0 -3.5003
  [3,353,9,0,0,4.471,0,-2.8,4.3134,0,-3.5003],
// 3 353 9 0 0 4.3134 0 -3.5003 3.8644 0 -4.094
  [3,353,9,0,0,4.3134,0,-3.5003,3.8644,0,-4.094],
// 3 353 9 0 0 3.8644 0 -4.094 0 0 -9
  [3,353,9,0,0,3.8644,0,-4.094,0,0,-9],
// 3 353 3.8644 0 -4.094 3.1925 0 -4.4907 0 0 -9
  [3,353,3.8644,0,-4.094,3.1925,0,-4.4907,0,0,-9],
// 3 353 3.1925 0 -4.4907 2.4 0 -4.63 0 0 -9
  [3,353,3.1925,0,-4.4907,2.4,0,-4.63,0,0,-9],
// 4 353 0 0 -9 2.4 0 -4.63 1.6075 0 -4.4907 -3.3 0 -4.03
  [4,353,0,0,-9,2.4,0,-4.63,1.6075,0,-4.4907,-3.3,0,-4.03],
// 3 353 -4.0925 0 -3.8907 0 0 -9 -3.3 0 -4.03
  [3,353,-4.0925,0,-3.8907,0,0,-9,-3.3,0,-4.03],
// 3 353 -4.7644 0 -3.494 0 0 -9 -4.0925 0 -3.8907
  [3,353,-4.7644,0,-3.494,0,0,-9,-4.0925,0,-3.8907],
// 3 353 -9 0 0 0 0 -9 -4.7644 0 -3.494
  [3,353,-9,0,0,0,0,-9,-4.7644,0,-3.494],
// 3 353 -9 0 0 -4.7644 0 -3.494 -5.2134 0 -2.9003
  [3,353,-9,0,0,-4.7644,0,-3.494,-5.2134,0,-2.9003],
// 3 353 -9 0 0 -5.2134 0 -2.9003 -5.371 0 -2.2
  [3,353,-9,0,0,-5.2134,0,-2.9003,-5.371,0,-2.2],
// 3 353 -9 0 0 -5.371 0 -2.2 -5.2134 0 -1.4997
  [3,353,-9,0,0,-5.371,0,-2.2,-5.2134,0,-1.4997],
// 3 353 -9 0 0 -5.2134 0 -1.4997 -4.7644 0 -0.906
  [3,353,-9,0,0,-5.2134,0,-1.4997,-4.7644,0,-0.906],
// 4 353 -9 0 0 -4.7644 0 -0.906 -4.0925 0 -0.5093 -2.2 0 5
  [4,353,-9,0,0,-4.7644,0,-0.906,-4.0925,0,-0.5093,-2.2,0,5],
// 3 353 -2.2 0 5 -4.0925 0 -0.5093 -3.3 0 -0.37
  [3,353,-2.2,0,5,-4.0925,0,-0.5093,-3.3,0,-0.37],
// 3 353 -2.2 0 5 -3.3 0 -0.37 -2.5075 0 -0.5093
  [3,353,-2.2,0,5,-3.3,0,-0.37,-2.5075,0,-0.5093],
// 3 353 -2.2 0 5 -2.5075 0 -0.5093 -2.2 0 -0.7
  [3,353,-2.2,0,5,-2.5075,0,-0.5093,-2.2,0,-0.7],
// 4 353 -2.5075 0 -3.8907 -3.3 0 -4.03 1.6075 0 -4.4907 0.9356 0 -4.094
  [4,353,-2.5075,0,-3.8907,-3.3,0,-4.03,1.6075,0,-4.4907,0.9356,0,-4.094],
// 4 353 -1.8356 0 -3.494 -2.5075 0 -3.8907 0.9356 0 -4.094 0.4866 0 -3.5003
  [4,353,-1.8356,0,-3.494,-2.5075,0,-3.8907,0.9356,0,-4.094,0.4866,0,-3.5003],
// 4 353 -1.3866 0 -2.9003 -1.8356 0 -3.494 0.4866 0 -3.5003 0.329 0 -2.8
  [4,353,-1.3866,0,-2.9003,-1.8356,0,-3.494,0.4866,0,-3.5003,0.329,0,-2.8],
// 4 353 -1.229 0 -2.2 -1.3866 0 -2.9003 0.329 0 -2.8 0.4866 0 -2.0997
  [4,353,-1.229,0,-2.2,-1.3866,0,-2.9003,0.329,0,-2.8,0.4866,0,-2.0997],
// 4 353 -1.21 0 2.6 -1.229 0 -2.2 0.4866 0 -2.0997 0.9356 0 -1.506
  [4,353,-1.21,0,2.6,-1.229,0,-2.2,0.4866,0,-2.0997,0.9356,0,-1.506],
// 4 353 -1.21 0 2.6 0.9356 0 -1.506 1.6075 0 -1.1093 3.5 0 2.1
  [4,353,-1.21,0,2.6,0.9356,0,-1.506,1.6075,0,-1.1093,3.5,0,2.1],
// 3 353 3.5 0 2.1 1.6075 0 -1.1093 2.4 0 -0.97
  [3,353,3.5,0,2.1,1.6075,0,-1.1093,2.4,0,-0.97],
// 3 353 3.5 0 2.1 2.4 0 -0.97 3.1925 0 -1.1093
  [3,353,3.5,0,2.1,2.4,0,-0.97,3.1925,0,-1.1093],
// 3 353 3.5 0 2.1 3.1925 0 -1.1093 3.5 0 -1.3
  [3,353,3.5,0,2.1,3.1925,0,-1.1093,3.5,0,-1.3],
// 1 353 0 0 0 9 0 0 0 1 0 0 0 9 1-4chrd.dat
  [1,353,0,0,0,9,0,0,0,1,0,0,0,9, ldraw_lib__1_4chrd()],
// 1 353 0 0 0 0 0 9 0 1 0 -9 0 0 1-4chrd.dat
  [1,353,0,0,0,0,0,9,0,1,0,-9,0,0, ldraw_lib__1_4chrd()],
// 1 353 0 0 0 -9 0 0 0 1 0 0 0 -9 1-4chrd.dat
  [1,353,0,0,0,-9,0,0,0,1,0,0,0,-9, ldraw_lib__1_4chrd()],
];
module ldraw_lib__98138p0l(step=0, col=false, unit=2/5, alt=false, line=0.2, solid=!$preview)
    makepoly(ldraw_lib__98138p0l(), step=step, col=col, unit=unit, alt=alt, line=line, solid=solid);
ldraw_lib__98138p0l(line=0.2);
